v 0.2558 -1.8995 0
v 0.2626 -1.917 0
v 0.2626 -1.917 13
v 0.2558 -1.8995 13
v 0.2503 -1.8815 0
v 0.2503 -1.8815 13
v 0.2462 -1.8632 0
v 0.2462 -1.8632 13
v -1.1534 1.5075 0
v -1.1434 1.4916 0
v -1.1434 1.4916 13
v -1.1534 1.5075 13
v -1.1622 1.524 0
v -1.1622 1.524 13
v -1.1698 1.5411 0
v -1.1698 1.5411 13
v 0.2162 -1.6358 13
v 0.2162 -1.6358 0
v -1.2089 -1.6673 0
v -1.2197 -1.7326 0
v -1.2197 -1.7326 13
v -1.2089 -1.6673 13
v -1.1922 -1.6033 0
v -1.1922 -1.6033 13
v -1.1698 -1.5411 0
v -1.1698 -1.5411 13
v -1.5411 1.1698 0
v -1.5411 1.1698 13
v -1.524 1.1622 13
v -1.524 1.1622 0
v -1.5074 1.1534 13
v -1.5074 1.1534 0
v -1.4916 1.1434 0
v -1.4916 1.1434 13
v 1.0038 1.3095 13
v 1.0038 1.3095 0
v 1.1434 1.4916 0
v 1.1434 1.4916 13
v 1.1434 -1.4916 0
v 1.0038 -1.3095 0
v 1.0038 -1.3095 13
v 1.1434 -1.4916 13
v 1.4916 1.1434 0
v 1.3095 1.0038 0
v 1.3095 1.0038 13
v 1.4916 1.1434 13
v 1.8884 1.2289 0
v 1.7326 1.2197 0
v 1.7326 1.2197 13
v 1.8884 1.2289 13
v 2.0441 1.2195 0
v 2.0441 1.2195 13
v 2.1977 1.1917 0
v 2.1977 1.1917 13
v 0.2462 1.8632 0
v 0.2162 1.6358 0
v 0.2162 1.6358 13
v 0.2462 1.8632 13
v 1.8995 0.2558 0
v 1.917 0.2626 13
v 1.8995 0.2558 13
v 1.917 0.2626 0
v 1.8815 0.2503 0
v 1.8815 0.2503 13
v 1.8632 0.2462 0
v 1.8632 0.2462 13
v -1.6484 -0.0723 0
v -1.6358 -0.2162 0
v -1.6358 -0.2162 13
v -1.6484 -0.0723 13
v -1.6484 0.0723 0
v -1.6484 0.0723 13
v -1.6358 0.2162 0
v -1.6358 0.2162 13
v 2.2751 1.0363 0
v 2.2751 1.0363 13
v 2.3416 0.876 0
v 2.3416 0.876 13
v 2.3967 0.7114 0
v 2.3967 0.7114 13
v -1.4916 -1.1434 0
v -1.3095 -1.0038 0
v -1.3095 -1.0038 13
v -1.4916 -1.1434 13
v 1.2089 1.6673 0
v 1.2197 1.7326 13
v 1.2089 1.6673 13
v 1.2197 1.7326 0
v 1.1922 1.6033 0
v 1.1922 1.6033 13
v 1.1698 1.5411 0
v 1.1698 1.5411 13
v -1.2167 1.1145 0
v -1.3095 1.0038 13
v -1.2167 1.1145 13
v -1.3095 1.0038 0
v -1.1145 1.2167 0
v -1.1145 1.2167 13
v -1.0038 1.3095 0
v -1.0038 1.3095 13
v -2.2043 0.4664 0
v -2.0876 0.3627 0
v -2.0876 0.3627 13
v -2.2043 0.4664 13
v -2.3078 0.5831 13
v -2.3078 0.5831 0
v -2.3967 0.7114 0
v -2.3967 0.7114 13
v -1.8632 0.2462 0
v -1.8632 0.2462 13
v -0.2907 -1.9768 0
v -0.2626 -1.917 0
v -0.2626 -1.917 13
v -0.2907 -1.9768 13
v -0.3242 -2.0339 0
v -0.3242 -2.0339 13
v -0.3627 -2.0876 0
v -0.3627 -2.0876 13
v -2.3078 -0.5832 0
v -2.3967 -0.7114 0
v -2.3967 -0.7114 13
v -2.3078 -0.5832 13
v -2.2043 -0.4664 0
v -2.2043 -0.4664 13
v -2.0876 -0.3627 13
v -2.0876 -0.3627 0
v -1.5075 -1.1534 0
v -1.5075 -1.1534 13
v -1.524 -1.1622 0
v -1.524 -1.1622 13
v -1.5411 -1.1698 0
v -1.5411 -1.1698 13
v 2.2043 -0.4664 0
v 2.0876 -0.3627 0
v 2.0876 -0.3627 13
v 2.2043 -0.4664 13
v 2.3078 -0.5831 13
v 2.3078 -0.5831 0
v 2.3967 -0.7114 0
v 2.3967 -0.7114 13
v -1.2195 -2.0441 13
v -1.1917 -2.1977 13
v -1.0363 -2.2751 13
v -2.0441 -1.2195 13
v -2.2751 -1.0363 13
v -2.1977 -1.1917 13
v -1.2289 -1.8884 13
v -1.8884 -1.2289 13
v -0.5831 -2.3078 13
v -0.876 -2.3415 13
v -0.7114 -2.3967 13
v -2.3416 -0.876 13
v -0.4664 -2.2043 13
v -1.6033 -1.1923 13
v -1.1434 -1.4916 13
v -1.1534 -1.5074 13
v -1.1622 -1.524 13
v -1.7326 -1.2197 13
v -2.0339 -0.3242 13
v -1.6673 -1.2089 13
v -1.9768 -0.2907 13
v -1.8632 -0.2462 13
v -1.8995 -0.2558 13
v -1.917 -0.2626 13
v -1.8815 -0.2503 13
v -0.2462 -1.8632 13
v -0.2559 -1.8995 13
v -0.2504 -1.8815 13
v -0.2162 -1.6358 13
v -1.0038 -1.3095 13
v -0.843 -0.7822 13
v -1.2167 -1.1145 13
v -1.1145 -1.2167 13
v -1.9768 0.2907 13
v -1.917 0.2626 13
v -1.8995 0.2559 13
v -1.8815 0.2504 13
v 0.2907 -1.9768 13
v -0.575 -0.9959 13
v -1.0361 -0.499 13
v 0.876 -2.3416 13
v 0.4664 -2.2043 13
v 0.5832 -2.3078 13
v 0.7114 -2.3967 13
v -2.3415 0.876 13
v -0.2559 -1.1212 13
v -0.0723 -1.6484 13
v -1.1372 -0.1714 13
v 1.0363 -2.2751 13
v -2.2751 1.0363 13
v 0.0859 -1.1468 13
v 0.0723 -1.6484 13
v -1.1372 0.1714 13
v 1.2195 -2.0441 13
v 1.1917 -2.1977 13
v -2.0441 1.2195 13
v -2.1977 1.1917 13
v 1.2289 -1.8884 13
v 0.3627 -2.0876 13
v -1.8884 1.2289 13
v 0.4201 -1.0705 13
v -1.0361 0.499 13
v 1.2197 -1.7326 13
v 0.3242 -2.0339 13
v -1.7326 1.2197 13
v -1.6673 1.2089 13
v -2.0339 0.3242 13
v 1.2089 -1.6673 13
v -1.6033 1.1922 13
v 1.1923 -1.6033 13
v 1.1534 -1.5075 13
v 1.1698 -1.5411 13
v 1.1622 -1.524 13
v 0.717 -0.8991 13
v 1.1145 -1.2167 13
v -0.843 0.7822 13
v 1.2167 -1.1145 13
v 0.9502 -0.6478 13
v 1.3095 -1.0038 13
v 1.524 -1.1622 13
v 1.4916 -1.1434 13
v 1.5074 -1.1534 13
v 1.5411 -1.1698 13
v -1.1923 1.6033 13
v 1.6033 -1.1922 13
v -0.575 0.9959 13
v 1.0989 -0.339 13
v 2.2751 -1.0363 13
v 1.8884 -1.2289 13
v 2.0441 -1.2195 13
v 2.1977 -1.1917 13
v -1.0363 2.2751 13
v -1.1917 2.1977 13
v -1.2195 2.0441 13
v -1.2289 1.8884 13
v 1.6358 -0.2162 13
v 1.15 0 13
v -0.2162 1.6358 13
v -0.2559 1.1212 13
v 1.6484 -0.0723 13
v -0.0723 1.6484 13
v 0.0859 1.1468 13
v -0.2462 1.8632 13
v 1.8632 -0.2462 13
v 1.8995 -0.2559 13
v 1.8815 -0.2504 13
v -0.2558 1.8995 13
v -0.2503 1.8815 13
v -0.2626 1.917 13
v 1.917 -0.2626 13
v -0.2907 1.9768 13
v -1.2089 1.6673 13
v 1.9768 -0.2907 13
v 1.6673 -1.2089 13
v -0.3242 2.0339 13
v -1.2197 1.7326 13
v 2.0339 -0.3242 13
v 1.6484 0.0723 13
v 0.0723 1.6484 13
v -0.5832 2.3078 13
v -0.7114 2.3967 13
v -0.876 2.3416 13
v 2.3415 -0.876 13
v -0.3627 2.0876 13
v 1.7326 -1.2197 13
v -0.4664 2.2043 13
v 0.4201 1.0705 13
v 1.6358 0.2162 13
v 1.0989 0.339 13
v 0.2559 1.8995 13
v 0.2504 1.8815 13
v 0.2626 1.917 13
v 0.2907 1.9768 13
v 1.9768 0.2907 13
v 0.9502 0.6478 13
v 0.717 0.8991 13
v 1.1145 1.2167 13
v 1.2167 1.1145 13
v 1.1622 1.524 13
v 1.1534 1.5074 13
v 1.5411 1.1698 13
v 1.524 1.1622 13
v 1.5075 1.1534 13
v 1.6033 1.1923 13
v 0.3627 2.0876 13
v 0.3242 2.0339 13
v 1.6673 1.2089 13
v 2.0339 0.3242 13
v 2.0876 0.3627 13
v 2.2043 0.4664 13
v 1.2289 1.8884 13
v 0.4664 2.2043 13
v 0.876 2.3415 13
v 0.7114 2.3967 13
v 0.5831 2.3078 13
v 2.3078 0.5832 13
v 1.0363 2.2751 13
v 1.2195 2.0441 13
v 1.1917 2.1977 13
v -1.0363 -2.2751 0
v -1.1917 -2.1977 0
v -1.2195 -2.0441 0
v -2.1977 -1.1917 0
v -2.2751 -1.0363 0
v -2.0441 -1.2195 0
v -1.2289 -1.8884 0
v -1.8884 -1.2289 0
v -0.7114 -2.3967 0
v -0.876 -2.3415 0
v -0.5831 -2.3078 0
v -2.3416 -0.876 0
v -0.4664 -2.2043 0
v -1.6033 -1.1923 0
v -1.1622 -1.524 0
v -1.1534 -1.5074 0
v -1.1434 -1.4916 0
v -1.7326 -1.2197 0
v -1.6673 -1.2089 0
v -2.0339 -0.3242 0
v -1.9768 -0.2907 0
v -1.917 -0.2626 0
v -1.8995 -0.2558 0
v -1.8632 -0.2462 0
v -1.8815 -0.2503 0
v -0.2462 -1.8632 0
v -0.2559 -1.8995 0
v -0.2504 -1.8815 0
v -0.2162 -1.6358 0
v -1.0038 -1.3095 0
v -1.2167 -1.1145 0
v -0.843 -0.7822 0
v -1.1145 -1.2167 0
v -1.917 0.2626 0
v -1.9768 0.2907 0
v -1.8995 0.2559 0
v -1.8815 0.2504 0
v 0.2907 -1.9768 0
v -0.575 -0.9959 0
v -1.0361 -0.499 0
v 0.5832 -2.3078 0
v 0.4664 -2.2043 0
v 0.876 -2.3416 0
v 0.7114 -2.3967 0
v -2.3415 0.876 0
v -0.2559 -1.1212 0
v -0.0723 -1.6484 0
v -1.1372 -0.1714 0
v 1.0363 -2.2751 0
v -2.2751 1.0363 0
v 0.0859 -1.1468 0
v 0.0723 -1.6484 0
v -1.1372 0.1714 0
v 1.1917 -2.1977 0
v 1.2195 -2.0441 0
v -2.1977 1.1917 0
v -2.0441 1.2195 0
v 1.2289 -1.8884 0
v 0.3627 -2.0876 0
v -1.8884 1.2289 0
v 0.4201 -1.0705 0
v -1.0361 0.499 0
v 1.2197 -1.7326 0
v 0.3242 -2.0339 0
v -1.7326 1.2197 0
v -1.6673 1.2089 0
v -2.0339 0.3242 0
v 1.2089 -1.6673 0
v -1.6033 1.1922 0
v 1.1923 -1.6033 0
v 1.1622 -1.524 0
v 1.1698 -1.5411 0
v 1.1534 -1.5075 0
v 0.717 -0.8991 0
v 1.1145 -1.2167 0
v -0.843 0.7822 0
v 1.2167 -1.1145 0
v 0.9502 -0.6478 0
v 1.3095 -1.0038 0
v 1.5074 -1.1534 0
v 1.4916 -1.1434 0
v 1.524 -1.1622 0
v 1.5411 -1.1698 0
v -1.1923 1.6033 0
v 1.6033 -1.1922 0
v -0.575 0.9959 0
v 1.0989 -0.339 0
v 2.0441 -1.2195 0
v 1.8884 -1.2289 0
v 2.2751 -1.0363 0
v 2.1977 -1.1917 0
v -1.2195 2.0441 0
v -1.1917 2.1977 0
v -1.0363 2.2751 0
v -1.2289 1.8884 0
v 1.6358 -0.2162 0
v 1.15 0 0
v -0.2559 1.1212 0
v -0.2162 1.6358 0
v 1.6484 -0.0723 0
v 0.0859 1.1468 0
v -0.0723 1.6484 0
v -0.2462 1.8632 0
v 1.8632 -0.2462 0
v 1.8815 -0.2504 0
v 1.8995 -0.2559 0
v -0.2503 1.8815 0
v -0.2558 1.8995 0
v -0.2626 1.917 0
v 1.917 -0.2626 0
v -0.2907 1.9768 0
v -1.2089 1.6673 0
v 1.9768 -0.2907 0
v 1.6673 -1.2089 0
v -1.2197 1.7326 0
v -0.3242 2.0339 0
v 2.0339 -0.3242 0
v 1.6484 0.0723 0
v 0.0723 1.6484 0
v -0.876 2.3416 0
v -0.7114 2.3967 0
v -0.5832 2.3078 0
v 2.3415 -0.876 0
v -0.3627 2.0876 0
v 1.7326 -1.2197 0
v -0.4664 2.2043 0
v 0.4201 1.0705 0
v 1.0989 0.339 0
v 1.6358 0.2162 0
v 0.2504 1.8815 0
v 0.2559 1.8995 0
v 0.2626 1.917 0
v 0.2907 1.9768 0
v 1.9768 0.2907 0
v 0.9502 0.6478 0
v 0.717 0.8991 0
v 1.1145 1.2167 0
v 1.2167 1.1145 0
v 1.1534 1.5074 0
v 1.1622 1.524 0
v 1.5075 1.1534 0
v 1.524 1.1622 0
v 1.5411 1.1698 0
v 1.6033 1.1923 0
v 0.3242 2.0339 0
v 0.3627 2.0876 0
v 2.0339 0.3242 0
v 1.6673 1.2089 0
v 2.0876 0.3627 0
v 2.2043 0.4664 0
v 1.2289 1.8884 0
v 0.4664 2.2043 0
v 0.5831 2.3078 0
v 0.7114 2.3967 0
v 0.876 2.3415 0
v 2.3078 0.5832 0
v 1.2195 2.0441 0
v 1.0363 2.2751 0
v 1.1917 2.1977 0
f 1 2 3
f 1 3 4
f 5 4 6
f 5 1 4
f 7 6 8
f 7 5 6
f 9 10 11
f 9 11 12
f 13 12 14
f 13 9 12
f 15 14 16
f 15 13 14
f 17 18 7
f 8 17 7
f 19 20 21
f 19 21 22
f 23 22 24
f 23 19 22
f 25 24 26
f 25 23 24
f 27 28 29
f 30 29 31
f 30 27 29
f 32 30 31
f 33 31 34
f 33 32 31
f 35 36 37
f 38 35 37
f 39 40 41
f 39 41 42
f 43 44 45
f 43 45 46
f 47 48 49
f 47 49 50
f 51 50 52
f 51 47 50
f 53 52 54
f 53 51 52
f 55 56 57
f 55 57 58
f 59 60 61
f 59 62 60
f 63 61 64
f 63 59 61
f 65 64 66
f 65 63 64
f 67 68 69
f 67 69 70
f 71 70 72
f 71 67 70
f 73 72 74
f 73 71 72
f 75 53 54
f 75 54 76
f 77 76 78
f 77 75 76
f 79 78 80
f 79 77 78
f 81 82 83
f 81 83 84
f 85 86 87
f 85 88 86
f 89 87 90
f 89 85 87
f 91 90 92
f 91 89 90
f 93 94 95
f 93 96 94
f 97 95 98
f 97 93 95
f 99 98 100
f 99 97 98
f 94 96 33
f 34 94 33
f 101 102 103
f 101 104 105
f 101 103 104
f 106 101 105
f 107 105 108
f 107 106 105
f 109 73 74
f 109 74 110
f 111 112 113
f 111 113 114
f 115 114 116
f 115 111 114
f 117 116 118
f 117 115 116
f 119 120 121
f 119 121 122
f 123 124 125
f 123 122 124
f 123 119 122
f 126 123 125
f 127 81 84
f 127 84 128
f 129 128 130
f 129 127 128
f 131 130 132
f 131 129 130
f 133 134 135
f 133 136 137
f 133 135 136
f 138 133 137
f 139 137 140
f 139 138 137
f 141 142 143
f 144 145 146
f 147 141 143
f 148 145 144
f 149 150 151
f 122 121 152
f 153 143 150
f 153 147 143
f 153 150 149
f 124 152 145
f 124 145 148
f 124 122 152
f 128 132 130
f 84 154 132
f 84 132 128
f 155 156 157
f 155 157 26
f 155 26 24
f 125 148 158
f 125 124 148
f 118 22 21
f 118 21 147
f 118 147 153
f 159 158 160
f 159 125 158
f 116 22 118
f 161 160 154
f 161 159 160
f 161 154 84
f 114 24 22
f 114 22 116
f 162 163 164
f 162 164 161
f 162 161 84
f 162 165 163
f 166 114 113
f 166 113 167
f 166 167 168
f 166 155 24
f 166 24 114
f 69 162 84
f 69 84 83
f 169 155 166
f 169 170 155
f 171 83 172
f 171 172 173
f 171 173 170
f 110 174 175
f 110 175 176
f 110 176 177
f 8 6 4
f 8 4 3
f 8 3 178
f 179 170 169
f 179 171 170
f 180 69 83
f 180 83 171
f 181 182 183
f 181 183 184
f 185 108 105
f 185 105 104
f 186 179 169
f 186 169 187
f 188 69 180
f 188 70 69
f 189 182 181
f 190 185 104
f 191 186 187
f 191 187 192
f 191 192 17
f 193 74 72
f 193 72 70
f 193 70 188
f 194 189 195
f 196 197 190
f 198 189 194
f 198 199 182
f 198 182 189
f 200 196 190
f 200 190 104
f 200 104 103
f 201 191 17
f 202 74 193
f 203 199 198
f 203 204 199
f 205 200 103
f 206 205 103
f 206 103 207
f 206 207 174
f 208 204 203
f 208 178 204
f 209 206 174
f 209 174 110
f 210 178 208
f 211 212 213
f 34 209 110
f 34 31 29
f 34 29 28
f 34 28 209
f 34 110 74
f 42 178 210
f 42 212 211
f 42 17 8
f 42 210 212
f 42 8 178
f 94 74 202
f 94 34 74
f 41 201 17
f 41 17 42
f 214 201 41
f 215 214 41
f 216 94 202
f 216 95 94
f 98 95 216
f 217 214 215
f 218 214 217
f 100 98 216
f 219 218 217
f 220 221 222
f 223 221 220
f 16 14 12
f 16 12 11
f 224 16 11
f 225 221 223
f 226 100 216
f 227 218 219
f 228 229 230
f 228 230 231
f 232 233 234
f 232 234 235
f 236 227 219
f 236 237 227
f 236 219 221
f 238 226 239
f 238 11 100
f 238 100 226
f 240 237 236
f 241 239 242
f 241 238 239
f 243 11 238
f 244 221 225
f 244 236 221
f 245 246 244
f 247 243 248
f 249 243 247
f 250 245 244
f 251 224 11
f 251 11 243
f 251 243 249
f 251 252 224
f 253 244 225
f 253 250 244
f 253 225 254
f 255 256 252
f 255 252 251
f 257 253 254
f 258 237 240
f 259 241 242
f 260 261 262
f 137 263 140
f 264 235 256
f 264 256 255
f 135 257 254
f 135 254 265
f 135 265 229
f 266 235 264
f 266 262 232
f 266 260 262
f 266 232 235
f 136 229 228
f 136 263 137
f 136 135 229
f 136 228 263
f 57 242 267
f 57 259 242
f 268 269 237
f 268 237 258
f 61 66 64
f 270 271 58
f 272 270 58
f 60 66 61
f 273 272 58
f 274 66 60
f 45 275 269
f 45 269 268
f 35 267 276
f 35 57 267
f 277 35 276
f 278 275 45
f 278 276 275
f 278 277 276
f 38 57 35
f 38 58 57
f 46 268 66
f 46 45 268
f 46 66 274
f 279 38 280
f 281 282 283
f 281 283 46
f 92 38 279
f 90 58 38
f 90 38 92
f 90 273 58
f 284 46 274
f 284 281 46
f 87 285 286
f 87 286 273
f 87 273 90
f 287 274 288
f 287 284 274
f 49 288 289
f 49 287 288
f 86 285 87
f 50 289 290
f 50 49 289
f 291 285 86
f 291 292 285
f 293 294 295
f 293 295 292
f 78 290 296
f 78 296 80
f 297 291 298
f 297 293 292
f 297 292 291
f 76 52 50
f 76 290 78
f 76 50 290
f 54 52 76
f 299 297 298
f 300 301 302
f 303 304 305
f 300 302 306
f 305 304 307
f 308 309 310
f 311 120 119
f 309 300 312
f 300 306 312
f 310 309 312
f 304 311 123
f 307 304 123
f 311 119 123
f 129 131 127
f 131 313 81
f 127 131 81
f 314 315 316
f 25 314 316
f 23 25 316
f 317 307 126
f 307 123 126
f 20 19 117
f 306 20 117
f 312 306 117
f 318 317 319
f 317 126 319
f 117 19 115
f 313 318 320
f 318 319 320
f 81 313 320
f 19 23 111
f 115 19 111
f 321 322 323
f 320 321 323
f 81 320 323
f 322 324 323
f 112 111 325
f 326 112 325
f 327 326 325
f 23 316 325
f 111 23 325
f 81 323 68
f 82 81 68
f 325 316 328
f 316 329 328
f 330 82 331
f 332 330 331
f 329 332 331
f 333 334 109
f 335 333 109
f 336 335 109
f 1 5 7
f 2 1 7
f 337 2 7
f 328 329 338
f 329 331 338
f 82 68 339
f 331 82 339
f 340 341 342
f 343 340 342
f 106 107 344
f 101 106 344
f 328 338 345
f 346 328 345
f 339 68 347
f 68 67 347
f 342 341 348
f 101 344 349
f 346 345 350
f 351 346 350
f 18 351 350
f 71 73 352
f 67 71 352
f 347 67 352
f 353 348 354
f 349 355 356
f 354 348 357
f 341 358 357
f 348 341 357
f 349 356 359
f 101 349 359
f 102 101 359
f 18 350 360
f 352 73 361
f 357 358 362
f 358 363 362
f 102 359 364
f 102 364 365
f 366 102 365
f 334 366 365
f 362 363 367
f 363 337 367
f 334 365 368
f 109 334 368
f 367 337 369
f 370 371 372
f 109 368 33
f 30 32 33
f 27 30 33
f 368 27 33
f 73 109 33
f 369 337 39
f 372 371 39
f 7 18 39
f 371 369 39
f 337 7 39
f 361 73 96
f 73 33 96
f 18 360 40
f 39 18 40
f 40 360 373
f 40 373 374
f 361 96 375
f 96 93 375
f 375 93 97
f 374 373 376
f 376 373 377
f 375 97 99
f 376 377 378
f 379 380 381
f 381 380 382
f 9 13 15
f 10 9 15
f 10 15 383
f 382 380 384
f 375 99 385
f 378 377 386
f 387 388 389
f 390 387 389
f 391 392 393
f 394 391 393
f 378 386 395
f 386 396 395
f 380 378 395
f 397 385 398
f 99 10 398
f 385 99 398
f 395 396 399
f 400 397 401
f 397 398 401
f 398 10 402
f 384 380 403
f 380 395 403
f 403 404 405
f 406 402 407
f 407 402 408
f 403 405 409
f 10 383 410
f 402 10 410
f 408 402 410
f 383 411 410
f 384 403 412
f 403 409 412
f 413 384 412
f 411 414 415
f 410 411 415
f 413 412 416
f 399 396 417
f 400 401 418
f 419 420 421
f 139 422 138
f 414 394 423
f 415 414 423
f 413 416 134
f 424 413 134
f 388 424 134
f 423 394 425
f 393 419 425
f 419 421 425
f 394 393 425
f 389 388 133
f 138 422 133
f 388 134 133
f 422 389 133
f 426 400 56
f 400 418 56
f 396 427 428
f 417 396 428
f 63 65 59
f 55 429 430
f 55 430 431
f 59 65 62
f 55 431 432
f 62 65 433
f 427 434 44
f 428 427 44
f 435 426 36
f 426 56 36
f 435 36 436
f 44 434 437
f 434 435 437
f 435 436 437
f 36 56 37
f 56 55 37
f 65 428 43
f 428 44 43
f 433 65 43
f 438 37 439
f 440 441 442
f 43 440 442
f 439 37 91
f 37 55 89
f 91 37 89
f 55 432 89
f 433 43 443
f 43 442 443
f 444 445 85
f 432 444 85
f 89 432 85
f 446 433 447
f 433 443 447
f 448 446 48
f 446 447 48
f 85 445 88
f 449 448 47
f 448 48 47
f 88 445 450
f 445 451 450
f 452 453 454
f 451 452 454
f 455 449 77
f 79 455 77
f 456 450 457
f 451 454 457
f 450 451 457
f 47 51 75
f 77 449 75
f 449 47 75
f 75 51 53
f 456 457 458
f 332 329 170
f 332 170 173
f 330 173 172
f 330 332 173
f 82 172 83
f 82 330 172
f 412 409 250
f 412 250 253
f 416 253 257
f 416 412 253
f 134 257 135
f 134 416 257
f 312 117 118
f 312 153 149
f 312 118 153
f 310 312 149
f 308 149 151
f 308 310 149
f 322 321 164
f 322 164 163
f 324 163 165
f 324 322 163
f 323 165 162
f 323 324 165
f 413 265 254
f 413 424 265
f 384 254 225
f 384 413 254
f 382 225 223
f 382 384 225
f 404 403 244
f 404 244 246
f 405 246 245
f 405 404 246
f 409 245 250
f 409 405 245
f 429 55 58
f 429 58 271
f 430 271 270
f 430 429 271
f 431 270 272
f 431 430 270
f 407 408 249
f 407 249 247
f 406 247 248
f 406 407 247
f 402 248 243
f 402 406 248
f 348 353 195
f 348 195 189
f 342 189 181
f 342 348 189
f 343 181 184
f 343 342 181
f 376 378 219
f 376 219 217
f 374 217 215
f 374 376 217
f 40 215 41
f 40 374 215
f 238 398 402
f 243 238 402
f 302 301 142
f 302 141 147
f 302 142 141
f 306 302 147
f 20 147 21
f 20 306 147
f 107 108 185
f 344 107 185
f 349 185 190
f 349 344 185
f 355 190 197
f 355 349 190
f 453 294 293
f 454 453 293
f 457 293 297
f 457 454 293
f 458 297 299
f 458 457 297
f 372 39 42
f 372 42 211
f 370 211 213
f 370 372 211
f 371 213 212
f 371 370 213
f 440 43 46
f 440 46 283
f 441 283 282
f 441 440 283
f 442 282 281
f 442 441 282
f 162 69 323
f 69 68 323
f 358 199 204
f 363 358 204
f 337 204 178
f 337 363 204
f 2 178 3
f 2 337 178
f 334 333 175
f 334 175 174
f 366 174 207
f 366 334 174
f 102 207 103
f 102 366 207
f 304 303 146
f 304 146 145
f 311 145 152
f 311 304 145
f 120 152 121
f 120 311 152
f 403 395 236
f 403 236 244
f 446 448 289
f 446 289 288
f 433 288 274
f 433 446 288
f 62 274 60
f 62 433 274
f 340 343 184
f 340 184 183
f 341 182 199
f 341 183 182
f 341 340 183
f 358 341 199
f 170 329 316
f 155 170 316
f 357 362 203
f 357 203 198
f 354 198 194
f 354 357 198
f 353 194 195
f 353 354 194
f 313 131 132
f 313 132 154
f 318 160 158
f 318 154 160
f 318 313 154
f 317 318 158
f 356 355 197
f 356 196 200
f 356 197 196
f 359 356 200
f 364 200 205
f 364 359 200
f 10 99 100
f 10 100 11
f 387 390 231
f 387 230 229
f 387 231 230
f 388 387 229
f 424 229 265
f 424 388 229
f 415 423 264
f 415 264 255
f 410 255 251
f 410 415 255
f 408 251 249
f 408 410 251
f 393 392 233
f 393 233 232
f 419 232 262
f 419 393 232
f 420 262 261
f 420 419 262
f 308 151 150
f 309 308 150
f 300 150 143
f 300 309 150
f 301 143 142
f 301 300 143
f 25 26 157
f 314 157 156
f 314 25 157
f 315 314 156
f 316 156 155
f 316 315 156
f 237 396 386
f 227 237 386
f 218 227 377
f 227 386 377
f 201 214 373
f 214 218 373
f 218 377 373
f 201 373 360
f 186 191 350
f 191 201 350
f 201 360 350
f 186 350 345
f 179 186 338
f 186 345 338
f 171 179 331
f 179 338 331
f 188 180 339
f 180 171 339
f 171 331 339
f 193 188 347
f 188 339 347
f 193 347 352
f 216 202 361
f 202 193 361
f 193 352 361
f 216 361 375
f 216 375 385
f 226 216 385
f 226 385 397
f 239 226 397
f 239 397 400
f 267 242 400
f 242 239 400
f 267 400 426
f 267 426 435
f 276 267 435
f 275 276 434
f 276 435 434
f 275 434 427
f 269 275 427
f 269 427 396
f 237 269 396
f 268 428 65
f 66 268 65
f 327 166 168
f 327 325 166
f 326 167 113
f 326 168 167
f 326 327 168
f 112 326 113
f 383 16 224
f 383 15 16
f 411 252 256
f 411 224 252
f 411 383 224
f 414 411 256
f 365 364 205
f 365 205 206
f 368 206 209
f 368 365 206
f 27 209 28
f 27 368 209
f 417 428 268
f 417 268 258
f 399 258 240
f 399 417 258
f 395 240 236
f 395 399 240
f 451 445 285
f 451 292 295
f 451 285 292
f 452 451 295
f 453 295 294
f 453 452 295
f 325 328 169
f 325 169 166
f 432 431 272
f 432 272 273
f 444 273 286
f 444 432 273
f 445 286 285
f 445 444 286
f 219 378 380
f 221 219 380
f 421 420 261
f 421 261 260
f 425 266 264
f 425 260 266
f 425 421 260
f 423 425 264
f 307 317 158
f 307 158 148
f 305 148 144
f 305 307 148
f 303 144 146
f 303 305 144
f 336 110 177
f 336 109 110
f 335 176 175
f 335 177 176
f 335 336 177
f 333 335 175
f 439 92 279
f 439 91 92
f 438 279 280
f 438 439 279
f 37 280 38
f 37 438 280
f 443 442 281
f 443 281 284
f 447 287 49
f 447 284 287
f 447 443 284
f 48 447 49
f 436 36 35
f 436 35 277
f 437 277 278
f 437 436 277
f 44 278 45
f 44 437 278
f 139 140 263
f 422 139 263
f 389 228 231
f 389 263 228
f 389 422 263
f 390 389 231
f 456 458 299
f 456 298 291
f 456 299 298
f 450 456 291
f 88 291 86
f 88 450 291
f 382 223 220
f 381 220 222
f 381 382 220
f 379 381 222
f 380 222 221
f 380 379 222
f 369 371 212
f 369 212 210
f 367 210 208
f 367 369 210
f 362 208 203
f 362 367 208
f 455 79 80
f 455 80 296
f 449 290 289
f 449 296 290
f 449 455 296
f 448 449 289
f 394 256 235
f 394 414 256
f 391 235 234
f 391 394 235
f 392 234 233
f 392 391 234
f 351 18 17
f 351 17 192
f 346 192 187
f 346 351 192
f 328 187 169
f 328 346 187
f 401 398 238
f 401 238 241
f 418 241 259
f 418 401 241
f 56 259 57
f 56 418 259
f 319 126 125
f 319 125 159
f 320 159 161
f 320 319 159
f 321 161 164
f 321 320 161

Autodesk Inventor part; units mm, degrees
ref_plane "YZ Plane" through (0, 0, 0) normal (1, 0, 0) x (0, 1, 0)
ref_plane "XZ Plane" through (0, 0, 0) normal (0, 1, 0) x (-1, 0, 0)
ref_plane "XY Plane" through (0, 0, 0) normal (0, 0, 1) x (1, 0, 0)
sketch "Sketch2" plane through (0, 0, 0) normal (0, 0, 1) x (1, 0, 0)
  arc A0 (0.2626, 1.917) -> (0.2462, 1.8632) centre (0.4994, 1.8157) ccw
  arc A1 (0.3627, 2.0876) -> (0.2626, 1.917) centre (0.9307, 1.6395) ccw
  arc A2 (0.7114, 2.3967) -> (0.3627, 2.0876) centre (1.3933, 1.2761) ccw
  arc A3 (-1.1698, 1.5411) -> (-1.1434, 1.4916) centre (-0.9308, 1.637) ccw
  arc A4 (-1.2197, 1.7326) -> (-1.1698, 1.5411) centre (-0.5012, 1.8175) ccw
  arc A5 (-1.1917, 2.1977) -> (-1.2197, 1.7326) centre (0.0829, 1.8876) ccw
  arc A6 (-1.917, 0.2626) -> (-1.8632, 0.2462) centre (-1.8157, 0.4994) ccw
  arc A7 (-2.0876, 0.3627) -> (-1.917, 0.2626) centre (-1.6395, 0.9307) ccw
  arc A8 (-2.3967, 0.7114) -> (-2.0876, 0.3627) centre (-1.2761, 1.3933) ccw
  arc A9 (-1.5411, -1.1698) -> (-1.4916, -1.1434) centre (-1.637, -0.9308) ccw
  arc A10 (-1.7326, -1.2197) -> (-1.5411, -1.1698) centre (-1.8175, -0.5012) ccw
  arc A11 (-2.1977, -1.1917) -> (-1.7326, -1.2197) centre (-1.8876, 0.0829) ccw
  arc A12 (-0.2626, -1.917) -> (-0.2462, -1.8632) centre (-0.4994, -1.8157) ccw
  arc A13 (-0.3627, -2.0876) -> (-0.2626, -1.917) centre (-0.9307, -1.6395) ccw
  arc A14 (-0.7114, -2.3967) -> (-0.3627, -2.0876) centre (-1.3933, -1.2761) ccw
  arc A15 (1.1698, -1.5411) -> (1.1434, -1.4916) centre (0.9308, -1.637) ccw
  arc A16 (1.2197, -1.7326) -> (1.1698, -1.5411) centre (0.5012, -1.8175) ccw
  arc A17 (1.1917, -2.1977) -> (1.2197, -1.7326) centre (-0.0829, -1.8876) ccw
  arc A18 (1.917, -0.2626) -> (1.8632, -0.2462) centre (1.8157, -0.4994) ccw
  arc A19 (2.0876, -0.3627) -> (1.917, -0.2626) centre (1.6395, -0.9307) ccw
  arc A20 (2.3967, -0.7114) -> (2.0876, -0.3627) centre (1.2761, -1.3933) ccw
  arc A21 (1.5411, 1.1698) -> (1.4916, 1.1434) centre (1.637, 0.9308) ccw
  arc A22 (1.7326, 1.2197) -> (1.5411, 1.1698) centre (1.8175, 0.5012) ccw
  arc A23 (2.1977, 1.1917) -> (1.7326, 1.2197) centre (1.8876, -0.0829) ccw
  arc A24 (-0.2462, 1.8632) -> (-0.2626, 1.917) centre (-0.4994, 1.8157) ccw
  arc A25 (-0.2626, 1.917) -> (-0.3627, 2.0876) centre (-0.9307, 1.6395) ccw
  arc A26 (-0.3627, 2.0876) -> (-0.7114, 2.3967) centre (-1.3933, 1.2761) ccw
  arc A27 (-1.4916, 1.1434) -> (-1.5411, 1.1698) centre (-1.637, 0.9308) ccw
  arc A28 (-1.5411, 1.1698) -> (-1.7326, 1.2197) centre (-1.8175, 0.5012) ccw
  arc A29 (-1.7326, 1.2197) -> (-2.1977, 1.1917) centre (-1.8876, -0.0829) ccw
  arc A30 (-1.8632, -0.2462) -> (-1.917, -0.2626) centre (-1.8157, -0.4994) ccw
  arc A31 (-1.917, -0.2626) -> (-2.0876, -0.3627) centre (-1.6395, -0.9307) ccw
  arc A32 (-2.0876, -0.3627) -> (-2.3967, -0.7114) centre (-1.2761, -1.3933) ccw
  arc A33 (-1.1434, -1.4916) -> (-1.1698, -1.5411) centre (-0.9308, -1.637) ccw
  arc A34 (-1.1698, -1.5411) -> (-1.2197, -1.7326) centre (-0.5012, -1.8175) ccw
  arc A35 (-1.2197, -1.7326) -> (-1.1917, -2.1977) centre (0.0829, -1.8876) ccw
  arc A36 (0.2462, -1.8632) -> (0.2626, -1.917) centre (0.4994, -1.8157) ccw
  arc A37 (0.2626, -1.917) -> (0.3627, -2.0876) centre (0.9307, -1.6395) ccw
  arc A38 (0.3627, -2.0876) -> (0.7114, -2.3967) centre (1.3933, -1.2761) ccw
  arc A39 (1.4916, -1.1434) -> (1.5411, -1.1698) centre (1.637, -0.9308) ccw
  arc A40 (1.5411, -1.1698) -> (1.7326, -1.2197) centre (1.8175, -0.5012) ccw
  arc A41 (1.7326, -1.2197) -> (2.1977, -1.1917) centre (1.8876, 0.0829) ccw
  arc A42 (1.8632, 0.2462) -> (1.917, 0.2626) centre (1.8157, 0.4994) ccw
  arc A43 (1.917, 0.2626) -> (2.0876, 0.3627) centre (1.6395, 0.9307) ccw
  arc A44 (2.0876, 0.3627) -> (2.3967, 0.7114) centre (1.2761, 1.3933) ccw
  arc A45 (1.1434, 1.4916) -> (1.1698, 1.5411) centre (0.9308, 1.637) ccw
  arc A46 (1.1698, 1.5411) -> (1.2197, 1.7326) centre (0.5012, 1.8175) ccw
  arc A47 (1.2197, 1.7326) -> (1.1917, 2.1977) centre (-0.0829, 1.8876) ccw
  arc A48 (0.2162, 1.6358) -> (-0.2162, 1.6358) centre (0, 0) ccw
  arc A49 (-1.0038, 1.3095) -> (-1.3095, 1.0038) centre (0, 0) ccw
  arc A50 (-1.6358, 0.2162) -> (-1.6358, -0.2162) centre (0, 0) ccw
  arc A51 (-1.3095, -1.0038) -> (-1.0038, -1.3095) centre (0, 0) ccw
  arc A52 (-0.2162, -1.6358) -> (0.2162, -1.6358) centre (0, 0) ccw
  arc A53 (1.0038, -1.3095) -> (1.3095, -1.0038) centre (0, 0) ccw
  arc A54 (1.6358, -0.2162) -> (1.6358, 0.2162) centre (0, 0) ccw
  arc A55 (1.3095, 1.0038) -> (1.0038, 1.3095) centre (0, 0) ccw
  arc A56 (-0.7114, 2.3967) -> (-1.1917, 2.1977) centre (0, 0) ccw
  arc A57 (-2.1977, 1.1917) -> (-2.3967, 0.7114) centre (0, 0) ccw
  arc A58 (-2.3967, -0.7114) -> (-2.1977, -1.1917) centre (0, 0) ccw
  arc A59 (-1.1917, -2.1977) -> (-0.7114, -2.3967) centre (0, 0) ccw
  arc A60 (0.7114, -2.3967) -> (1.1917, -2.1977) centre (0, 0) ccw
  arc A61 (2.1977, -1.1917) -> (2.3967, -0.7114) centre (0, 0) ccw
  arc A62 (2.3967, 0.7114) -> (2.1977, 1.1917) centre (0, 0) ccw
  arc A63 (1.1917, 2.1977) -> (0.7114, 2.3967) centre (0, 0) ccw
  line L0 (0.2162, 1.6358) -> (0.2462, 1.8632)
  line L1 (-1.0038, 1.3095) -> (-1.1434, 1.4916)
  line L2 (-1.6358, 0.2162) -> (-1.8632, 0.2462)
  line L3 (-1.3095, -1.0038) -> (-1.4916, -1.1434)
  line L4 (-0.2162, -1.6358) -> (-0.2462, -1.8632)
  line L5 (1.0038, -1.3095) -> (1.1434, -1.4916)
  line L6 (1.6358, -0.2162) -> (1.8632, -0.2462)
  line L7 (1.3095, 1.0038) -> (1.4916, 1.1434)
  line L8 (-0.2162, 1.6358) -> (-0.2462, 1.8632)
  line L9 (-1.3095, 1.0038) -> (-1.4916, 1.1434)
  line L10 (-1.6358, -0.2162) -> (-1.8632, -0.2462)
  line L11 (-1.0038, -1.3095) -> (-1.1434, -1.4916)
  line L12 (0.2162, -1.6358) -> (0.2462, -1.8632)
  line L13 (1.3095, -1.0038) -> (1.4916, -1.1434)
  line L14 (1.6358, 0.2162) -> (1.8632, 0.2462)
  line L15 (1.0038, 1.3095) -> (1.1434, 1.4916)
  circle A64 centre (0, 0) radius 1.15
  point P0 (1.3095, 1.0038)
  point P1 (1.0038, 1.3095)
  point P2 (1.1434, 1.4916)
  point P3 (1.1683, 1.5373)
  point P4 (1.2195, 1.7312)
  point P5 (1.1917, 2.1977)
  point P6 (0.7114, 2.3967)
  point P7 (0.3618, 2.0865)
  point P8 (0.261, 1.9131)
  point P9 (0.2462, 1.8632)
  point P10 (0.2162, 1.6358)
  point P11 (-0.2162, 1.6358)
  point P12 (-0.2462, 1.8632)
  point P13 (-0.261, 1.9131)
  point P14 (-0.3618, 2.0865)
  point P15 (-0.7114, 2.3967)
  point P16 (-1.1917, 2.1977)
  point P17 (-1.2195, 1.7312)
  point P18 (-1.1683, 1.5373)
  point P19 (-1.1434, 1.4916)
  point P20 (-1.0038, 1.3095)
  point P21 (-1.3095, 1.0038)
  point P22 (-1.4916, 1.1434)
  point P23 (-1.5373, 1.1683)
  point P24 (-1.7312, 1.2195)
  point P25 (-2.1977, 1.1917)
  point P26 (-2.3967, 0.7114)
  point P27 (-2.0865, 0.3618)
  point P28 (-1.9131, 0.261)
  point P29 (-1.8632, 0.2462)
  point P30 (-1.6358, 0.2162)
  point P31 (-1.6358, -0.2162)
  point P32 (-1.8632, -0.2462)
  point P33 (-1.9131, -0.261)
  point P34 (-2.0865, -0.3618)
  point P35 (-2.3967, -0.7114)
  point P36 (-2.1977, -1.1917)
  point P37 (-1.7312, -1.2195)
  point P38 (-1.5373, -1.1683)
  point P39 (-1.4916, -1.1434)
  point P40 (-1.3095, -1.0038)
  point P41 (-1.0038, -1.3095)
  point P42 (-1.1434, -1.4916)
  point P43 (-1.1683, -1.5373)
  point P44 (-1.2195, -1.7312)
  point P45 (-1.1917, -2.1977)
  point P46 (-0.7114, -2.3967)
  point P47 (-0.3618, -2.0865)
  point P48 (-0.261, -1.9131)
  point P49 (-0.2462, -1.8632)
  point P50 (-0.2162, -1.6358)
  point P51 (0.2162, -1.6358)
  point P52 (0.2462, -1.8632)
  point P53 (0.261, -1.9131)
  point P54 (0.3618, -2.0865)
  point P55 (0.7114, -2.3967)
  point P56 (1.1917, -2.1977)
  point P57 (1.2195, -1.7312)
  point P58 (1.1683, -1.5373)
  point P59 (1.1434, -1.4916)
  point P60 (1.0038, -1.3095)
  point P61 (1.3095, -1.0038)
  point P62 (1.4916, -1.1434)
  point P63 (1.5373, -1.1683)
  point P64 (1.7312, -1.2195)
  point P65 (2.1977, -1.1917)
  point P66 (2.3967, -0.7114)
  point P67 (2.0865, -0.3618)
  point P68 (1.9131, -0.261)
  point P69 (1.8632, -0.2462)
  point P70 (1.6358, -0.2162)
  point P71 (1.6358, 0.2162)
  point P72 (1.8632, 0.2462)
  point P73 (1.9131, 0.261)
  point P74 (2.0865, 0.3618)
  point P75 (2.3967, 0.7114)
  point P76 (2.1977, 1.1917)
  point P77 (1.7312, 1.2195)
  point P78 (1.5373, 1.1683)
  point P79 (1.4916, 1.1434)
  point P80 (1.1698, 1.5411)
  point P81 (1.2197, 1.7326)
  point P82 (0.3627, 2.0876)
  point P83 (0.2626, 1.917)
  point P84 (-0.2626, 1.917)
  point P85 (-0.3627, 2.0876)
  point P86 (-1.2197, 1.7326)
  point P87 (-1.1698, 1.5411)
  point P88 (-1.5411, 1.1698)
  point P89 (-1.7326, 1.2197)
  point P90 (-2.0876, 0.3627)
  point P91 (-1.917, 0.2626)
  point P92 (-1.917, -0.2626)
  point P93 (-2.0876, -0.3627)
  point P94 (-1.7326, -1.2197)
  point P95 (-1.5411, -1.1698)
  point P96 (-1.1698, -1.5411)
  point P97 (-1.2197, -1.7326)
  point P98 (-0.3627, -2.0876)
  point P99 (-0.2626, -1.917)
  point P100 (0.2626, -1.917)
  point P101 (0.3627, -2.0876)
  point P102 (1.2197, -1.7326)
  point P103 (1.1698, -1.5411)
  point P104 (1.5411, -1.1698)
  point P105 (1.7326, -1.2197)
  point P106 (2.0876, -0.3627)
  point P107 (1.917, -0.2626)
  point P108 (1.917, 0.2626)
  point P109 (2.0876, 0.3627)
  point P110 (1.7326, 1.2197)
  point P111 (1.5411, 1.1698)
  dimension "d6" = 2.3
extrude "Extrusion2" add sketch "Sketch2" along normal blind 13
properties part number "ぴにょん" material "Aluminum 2014-T6"
